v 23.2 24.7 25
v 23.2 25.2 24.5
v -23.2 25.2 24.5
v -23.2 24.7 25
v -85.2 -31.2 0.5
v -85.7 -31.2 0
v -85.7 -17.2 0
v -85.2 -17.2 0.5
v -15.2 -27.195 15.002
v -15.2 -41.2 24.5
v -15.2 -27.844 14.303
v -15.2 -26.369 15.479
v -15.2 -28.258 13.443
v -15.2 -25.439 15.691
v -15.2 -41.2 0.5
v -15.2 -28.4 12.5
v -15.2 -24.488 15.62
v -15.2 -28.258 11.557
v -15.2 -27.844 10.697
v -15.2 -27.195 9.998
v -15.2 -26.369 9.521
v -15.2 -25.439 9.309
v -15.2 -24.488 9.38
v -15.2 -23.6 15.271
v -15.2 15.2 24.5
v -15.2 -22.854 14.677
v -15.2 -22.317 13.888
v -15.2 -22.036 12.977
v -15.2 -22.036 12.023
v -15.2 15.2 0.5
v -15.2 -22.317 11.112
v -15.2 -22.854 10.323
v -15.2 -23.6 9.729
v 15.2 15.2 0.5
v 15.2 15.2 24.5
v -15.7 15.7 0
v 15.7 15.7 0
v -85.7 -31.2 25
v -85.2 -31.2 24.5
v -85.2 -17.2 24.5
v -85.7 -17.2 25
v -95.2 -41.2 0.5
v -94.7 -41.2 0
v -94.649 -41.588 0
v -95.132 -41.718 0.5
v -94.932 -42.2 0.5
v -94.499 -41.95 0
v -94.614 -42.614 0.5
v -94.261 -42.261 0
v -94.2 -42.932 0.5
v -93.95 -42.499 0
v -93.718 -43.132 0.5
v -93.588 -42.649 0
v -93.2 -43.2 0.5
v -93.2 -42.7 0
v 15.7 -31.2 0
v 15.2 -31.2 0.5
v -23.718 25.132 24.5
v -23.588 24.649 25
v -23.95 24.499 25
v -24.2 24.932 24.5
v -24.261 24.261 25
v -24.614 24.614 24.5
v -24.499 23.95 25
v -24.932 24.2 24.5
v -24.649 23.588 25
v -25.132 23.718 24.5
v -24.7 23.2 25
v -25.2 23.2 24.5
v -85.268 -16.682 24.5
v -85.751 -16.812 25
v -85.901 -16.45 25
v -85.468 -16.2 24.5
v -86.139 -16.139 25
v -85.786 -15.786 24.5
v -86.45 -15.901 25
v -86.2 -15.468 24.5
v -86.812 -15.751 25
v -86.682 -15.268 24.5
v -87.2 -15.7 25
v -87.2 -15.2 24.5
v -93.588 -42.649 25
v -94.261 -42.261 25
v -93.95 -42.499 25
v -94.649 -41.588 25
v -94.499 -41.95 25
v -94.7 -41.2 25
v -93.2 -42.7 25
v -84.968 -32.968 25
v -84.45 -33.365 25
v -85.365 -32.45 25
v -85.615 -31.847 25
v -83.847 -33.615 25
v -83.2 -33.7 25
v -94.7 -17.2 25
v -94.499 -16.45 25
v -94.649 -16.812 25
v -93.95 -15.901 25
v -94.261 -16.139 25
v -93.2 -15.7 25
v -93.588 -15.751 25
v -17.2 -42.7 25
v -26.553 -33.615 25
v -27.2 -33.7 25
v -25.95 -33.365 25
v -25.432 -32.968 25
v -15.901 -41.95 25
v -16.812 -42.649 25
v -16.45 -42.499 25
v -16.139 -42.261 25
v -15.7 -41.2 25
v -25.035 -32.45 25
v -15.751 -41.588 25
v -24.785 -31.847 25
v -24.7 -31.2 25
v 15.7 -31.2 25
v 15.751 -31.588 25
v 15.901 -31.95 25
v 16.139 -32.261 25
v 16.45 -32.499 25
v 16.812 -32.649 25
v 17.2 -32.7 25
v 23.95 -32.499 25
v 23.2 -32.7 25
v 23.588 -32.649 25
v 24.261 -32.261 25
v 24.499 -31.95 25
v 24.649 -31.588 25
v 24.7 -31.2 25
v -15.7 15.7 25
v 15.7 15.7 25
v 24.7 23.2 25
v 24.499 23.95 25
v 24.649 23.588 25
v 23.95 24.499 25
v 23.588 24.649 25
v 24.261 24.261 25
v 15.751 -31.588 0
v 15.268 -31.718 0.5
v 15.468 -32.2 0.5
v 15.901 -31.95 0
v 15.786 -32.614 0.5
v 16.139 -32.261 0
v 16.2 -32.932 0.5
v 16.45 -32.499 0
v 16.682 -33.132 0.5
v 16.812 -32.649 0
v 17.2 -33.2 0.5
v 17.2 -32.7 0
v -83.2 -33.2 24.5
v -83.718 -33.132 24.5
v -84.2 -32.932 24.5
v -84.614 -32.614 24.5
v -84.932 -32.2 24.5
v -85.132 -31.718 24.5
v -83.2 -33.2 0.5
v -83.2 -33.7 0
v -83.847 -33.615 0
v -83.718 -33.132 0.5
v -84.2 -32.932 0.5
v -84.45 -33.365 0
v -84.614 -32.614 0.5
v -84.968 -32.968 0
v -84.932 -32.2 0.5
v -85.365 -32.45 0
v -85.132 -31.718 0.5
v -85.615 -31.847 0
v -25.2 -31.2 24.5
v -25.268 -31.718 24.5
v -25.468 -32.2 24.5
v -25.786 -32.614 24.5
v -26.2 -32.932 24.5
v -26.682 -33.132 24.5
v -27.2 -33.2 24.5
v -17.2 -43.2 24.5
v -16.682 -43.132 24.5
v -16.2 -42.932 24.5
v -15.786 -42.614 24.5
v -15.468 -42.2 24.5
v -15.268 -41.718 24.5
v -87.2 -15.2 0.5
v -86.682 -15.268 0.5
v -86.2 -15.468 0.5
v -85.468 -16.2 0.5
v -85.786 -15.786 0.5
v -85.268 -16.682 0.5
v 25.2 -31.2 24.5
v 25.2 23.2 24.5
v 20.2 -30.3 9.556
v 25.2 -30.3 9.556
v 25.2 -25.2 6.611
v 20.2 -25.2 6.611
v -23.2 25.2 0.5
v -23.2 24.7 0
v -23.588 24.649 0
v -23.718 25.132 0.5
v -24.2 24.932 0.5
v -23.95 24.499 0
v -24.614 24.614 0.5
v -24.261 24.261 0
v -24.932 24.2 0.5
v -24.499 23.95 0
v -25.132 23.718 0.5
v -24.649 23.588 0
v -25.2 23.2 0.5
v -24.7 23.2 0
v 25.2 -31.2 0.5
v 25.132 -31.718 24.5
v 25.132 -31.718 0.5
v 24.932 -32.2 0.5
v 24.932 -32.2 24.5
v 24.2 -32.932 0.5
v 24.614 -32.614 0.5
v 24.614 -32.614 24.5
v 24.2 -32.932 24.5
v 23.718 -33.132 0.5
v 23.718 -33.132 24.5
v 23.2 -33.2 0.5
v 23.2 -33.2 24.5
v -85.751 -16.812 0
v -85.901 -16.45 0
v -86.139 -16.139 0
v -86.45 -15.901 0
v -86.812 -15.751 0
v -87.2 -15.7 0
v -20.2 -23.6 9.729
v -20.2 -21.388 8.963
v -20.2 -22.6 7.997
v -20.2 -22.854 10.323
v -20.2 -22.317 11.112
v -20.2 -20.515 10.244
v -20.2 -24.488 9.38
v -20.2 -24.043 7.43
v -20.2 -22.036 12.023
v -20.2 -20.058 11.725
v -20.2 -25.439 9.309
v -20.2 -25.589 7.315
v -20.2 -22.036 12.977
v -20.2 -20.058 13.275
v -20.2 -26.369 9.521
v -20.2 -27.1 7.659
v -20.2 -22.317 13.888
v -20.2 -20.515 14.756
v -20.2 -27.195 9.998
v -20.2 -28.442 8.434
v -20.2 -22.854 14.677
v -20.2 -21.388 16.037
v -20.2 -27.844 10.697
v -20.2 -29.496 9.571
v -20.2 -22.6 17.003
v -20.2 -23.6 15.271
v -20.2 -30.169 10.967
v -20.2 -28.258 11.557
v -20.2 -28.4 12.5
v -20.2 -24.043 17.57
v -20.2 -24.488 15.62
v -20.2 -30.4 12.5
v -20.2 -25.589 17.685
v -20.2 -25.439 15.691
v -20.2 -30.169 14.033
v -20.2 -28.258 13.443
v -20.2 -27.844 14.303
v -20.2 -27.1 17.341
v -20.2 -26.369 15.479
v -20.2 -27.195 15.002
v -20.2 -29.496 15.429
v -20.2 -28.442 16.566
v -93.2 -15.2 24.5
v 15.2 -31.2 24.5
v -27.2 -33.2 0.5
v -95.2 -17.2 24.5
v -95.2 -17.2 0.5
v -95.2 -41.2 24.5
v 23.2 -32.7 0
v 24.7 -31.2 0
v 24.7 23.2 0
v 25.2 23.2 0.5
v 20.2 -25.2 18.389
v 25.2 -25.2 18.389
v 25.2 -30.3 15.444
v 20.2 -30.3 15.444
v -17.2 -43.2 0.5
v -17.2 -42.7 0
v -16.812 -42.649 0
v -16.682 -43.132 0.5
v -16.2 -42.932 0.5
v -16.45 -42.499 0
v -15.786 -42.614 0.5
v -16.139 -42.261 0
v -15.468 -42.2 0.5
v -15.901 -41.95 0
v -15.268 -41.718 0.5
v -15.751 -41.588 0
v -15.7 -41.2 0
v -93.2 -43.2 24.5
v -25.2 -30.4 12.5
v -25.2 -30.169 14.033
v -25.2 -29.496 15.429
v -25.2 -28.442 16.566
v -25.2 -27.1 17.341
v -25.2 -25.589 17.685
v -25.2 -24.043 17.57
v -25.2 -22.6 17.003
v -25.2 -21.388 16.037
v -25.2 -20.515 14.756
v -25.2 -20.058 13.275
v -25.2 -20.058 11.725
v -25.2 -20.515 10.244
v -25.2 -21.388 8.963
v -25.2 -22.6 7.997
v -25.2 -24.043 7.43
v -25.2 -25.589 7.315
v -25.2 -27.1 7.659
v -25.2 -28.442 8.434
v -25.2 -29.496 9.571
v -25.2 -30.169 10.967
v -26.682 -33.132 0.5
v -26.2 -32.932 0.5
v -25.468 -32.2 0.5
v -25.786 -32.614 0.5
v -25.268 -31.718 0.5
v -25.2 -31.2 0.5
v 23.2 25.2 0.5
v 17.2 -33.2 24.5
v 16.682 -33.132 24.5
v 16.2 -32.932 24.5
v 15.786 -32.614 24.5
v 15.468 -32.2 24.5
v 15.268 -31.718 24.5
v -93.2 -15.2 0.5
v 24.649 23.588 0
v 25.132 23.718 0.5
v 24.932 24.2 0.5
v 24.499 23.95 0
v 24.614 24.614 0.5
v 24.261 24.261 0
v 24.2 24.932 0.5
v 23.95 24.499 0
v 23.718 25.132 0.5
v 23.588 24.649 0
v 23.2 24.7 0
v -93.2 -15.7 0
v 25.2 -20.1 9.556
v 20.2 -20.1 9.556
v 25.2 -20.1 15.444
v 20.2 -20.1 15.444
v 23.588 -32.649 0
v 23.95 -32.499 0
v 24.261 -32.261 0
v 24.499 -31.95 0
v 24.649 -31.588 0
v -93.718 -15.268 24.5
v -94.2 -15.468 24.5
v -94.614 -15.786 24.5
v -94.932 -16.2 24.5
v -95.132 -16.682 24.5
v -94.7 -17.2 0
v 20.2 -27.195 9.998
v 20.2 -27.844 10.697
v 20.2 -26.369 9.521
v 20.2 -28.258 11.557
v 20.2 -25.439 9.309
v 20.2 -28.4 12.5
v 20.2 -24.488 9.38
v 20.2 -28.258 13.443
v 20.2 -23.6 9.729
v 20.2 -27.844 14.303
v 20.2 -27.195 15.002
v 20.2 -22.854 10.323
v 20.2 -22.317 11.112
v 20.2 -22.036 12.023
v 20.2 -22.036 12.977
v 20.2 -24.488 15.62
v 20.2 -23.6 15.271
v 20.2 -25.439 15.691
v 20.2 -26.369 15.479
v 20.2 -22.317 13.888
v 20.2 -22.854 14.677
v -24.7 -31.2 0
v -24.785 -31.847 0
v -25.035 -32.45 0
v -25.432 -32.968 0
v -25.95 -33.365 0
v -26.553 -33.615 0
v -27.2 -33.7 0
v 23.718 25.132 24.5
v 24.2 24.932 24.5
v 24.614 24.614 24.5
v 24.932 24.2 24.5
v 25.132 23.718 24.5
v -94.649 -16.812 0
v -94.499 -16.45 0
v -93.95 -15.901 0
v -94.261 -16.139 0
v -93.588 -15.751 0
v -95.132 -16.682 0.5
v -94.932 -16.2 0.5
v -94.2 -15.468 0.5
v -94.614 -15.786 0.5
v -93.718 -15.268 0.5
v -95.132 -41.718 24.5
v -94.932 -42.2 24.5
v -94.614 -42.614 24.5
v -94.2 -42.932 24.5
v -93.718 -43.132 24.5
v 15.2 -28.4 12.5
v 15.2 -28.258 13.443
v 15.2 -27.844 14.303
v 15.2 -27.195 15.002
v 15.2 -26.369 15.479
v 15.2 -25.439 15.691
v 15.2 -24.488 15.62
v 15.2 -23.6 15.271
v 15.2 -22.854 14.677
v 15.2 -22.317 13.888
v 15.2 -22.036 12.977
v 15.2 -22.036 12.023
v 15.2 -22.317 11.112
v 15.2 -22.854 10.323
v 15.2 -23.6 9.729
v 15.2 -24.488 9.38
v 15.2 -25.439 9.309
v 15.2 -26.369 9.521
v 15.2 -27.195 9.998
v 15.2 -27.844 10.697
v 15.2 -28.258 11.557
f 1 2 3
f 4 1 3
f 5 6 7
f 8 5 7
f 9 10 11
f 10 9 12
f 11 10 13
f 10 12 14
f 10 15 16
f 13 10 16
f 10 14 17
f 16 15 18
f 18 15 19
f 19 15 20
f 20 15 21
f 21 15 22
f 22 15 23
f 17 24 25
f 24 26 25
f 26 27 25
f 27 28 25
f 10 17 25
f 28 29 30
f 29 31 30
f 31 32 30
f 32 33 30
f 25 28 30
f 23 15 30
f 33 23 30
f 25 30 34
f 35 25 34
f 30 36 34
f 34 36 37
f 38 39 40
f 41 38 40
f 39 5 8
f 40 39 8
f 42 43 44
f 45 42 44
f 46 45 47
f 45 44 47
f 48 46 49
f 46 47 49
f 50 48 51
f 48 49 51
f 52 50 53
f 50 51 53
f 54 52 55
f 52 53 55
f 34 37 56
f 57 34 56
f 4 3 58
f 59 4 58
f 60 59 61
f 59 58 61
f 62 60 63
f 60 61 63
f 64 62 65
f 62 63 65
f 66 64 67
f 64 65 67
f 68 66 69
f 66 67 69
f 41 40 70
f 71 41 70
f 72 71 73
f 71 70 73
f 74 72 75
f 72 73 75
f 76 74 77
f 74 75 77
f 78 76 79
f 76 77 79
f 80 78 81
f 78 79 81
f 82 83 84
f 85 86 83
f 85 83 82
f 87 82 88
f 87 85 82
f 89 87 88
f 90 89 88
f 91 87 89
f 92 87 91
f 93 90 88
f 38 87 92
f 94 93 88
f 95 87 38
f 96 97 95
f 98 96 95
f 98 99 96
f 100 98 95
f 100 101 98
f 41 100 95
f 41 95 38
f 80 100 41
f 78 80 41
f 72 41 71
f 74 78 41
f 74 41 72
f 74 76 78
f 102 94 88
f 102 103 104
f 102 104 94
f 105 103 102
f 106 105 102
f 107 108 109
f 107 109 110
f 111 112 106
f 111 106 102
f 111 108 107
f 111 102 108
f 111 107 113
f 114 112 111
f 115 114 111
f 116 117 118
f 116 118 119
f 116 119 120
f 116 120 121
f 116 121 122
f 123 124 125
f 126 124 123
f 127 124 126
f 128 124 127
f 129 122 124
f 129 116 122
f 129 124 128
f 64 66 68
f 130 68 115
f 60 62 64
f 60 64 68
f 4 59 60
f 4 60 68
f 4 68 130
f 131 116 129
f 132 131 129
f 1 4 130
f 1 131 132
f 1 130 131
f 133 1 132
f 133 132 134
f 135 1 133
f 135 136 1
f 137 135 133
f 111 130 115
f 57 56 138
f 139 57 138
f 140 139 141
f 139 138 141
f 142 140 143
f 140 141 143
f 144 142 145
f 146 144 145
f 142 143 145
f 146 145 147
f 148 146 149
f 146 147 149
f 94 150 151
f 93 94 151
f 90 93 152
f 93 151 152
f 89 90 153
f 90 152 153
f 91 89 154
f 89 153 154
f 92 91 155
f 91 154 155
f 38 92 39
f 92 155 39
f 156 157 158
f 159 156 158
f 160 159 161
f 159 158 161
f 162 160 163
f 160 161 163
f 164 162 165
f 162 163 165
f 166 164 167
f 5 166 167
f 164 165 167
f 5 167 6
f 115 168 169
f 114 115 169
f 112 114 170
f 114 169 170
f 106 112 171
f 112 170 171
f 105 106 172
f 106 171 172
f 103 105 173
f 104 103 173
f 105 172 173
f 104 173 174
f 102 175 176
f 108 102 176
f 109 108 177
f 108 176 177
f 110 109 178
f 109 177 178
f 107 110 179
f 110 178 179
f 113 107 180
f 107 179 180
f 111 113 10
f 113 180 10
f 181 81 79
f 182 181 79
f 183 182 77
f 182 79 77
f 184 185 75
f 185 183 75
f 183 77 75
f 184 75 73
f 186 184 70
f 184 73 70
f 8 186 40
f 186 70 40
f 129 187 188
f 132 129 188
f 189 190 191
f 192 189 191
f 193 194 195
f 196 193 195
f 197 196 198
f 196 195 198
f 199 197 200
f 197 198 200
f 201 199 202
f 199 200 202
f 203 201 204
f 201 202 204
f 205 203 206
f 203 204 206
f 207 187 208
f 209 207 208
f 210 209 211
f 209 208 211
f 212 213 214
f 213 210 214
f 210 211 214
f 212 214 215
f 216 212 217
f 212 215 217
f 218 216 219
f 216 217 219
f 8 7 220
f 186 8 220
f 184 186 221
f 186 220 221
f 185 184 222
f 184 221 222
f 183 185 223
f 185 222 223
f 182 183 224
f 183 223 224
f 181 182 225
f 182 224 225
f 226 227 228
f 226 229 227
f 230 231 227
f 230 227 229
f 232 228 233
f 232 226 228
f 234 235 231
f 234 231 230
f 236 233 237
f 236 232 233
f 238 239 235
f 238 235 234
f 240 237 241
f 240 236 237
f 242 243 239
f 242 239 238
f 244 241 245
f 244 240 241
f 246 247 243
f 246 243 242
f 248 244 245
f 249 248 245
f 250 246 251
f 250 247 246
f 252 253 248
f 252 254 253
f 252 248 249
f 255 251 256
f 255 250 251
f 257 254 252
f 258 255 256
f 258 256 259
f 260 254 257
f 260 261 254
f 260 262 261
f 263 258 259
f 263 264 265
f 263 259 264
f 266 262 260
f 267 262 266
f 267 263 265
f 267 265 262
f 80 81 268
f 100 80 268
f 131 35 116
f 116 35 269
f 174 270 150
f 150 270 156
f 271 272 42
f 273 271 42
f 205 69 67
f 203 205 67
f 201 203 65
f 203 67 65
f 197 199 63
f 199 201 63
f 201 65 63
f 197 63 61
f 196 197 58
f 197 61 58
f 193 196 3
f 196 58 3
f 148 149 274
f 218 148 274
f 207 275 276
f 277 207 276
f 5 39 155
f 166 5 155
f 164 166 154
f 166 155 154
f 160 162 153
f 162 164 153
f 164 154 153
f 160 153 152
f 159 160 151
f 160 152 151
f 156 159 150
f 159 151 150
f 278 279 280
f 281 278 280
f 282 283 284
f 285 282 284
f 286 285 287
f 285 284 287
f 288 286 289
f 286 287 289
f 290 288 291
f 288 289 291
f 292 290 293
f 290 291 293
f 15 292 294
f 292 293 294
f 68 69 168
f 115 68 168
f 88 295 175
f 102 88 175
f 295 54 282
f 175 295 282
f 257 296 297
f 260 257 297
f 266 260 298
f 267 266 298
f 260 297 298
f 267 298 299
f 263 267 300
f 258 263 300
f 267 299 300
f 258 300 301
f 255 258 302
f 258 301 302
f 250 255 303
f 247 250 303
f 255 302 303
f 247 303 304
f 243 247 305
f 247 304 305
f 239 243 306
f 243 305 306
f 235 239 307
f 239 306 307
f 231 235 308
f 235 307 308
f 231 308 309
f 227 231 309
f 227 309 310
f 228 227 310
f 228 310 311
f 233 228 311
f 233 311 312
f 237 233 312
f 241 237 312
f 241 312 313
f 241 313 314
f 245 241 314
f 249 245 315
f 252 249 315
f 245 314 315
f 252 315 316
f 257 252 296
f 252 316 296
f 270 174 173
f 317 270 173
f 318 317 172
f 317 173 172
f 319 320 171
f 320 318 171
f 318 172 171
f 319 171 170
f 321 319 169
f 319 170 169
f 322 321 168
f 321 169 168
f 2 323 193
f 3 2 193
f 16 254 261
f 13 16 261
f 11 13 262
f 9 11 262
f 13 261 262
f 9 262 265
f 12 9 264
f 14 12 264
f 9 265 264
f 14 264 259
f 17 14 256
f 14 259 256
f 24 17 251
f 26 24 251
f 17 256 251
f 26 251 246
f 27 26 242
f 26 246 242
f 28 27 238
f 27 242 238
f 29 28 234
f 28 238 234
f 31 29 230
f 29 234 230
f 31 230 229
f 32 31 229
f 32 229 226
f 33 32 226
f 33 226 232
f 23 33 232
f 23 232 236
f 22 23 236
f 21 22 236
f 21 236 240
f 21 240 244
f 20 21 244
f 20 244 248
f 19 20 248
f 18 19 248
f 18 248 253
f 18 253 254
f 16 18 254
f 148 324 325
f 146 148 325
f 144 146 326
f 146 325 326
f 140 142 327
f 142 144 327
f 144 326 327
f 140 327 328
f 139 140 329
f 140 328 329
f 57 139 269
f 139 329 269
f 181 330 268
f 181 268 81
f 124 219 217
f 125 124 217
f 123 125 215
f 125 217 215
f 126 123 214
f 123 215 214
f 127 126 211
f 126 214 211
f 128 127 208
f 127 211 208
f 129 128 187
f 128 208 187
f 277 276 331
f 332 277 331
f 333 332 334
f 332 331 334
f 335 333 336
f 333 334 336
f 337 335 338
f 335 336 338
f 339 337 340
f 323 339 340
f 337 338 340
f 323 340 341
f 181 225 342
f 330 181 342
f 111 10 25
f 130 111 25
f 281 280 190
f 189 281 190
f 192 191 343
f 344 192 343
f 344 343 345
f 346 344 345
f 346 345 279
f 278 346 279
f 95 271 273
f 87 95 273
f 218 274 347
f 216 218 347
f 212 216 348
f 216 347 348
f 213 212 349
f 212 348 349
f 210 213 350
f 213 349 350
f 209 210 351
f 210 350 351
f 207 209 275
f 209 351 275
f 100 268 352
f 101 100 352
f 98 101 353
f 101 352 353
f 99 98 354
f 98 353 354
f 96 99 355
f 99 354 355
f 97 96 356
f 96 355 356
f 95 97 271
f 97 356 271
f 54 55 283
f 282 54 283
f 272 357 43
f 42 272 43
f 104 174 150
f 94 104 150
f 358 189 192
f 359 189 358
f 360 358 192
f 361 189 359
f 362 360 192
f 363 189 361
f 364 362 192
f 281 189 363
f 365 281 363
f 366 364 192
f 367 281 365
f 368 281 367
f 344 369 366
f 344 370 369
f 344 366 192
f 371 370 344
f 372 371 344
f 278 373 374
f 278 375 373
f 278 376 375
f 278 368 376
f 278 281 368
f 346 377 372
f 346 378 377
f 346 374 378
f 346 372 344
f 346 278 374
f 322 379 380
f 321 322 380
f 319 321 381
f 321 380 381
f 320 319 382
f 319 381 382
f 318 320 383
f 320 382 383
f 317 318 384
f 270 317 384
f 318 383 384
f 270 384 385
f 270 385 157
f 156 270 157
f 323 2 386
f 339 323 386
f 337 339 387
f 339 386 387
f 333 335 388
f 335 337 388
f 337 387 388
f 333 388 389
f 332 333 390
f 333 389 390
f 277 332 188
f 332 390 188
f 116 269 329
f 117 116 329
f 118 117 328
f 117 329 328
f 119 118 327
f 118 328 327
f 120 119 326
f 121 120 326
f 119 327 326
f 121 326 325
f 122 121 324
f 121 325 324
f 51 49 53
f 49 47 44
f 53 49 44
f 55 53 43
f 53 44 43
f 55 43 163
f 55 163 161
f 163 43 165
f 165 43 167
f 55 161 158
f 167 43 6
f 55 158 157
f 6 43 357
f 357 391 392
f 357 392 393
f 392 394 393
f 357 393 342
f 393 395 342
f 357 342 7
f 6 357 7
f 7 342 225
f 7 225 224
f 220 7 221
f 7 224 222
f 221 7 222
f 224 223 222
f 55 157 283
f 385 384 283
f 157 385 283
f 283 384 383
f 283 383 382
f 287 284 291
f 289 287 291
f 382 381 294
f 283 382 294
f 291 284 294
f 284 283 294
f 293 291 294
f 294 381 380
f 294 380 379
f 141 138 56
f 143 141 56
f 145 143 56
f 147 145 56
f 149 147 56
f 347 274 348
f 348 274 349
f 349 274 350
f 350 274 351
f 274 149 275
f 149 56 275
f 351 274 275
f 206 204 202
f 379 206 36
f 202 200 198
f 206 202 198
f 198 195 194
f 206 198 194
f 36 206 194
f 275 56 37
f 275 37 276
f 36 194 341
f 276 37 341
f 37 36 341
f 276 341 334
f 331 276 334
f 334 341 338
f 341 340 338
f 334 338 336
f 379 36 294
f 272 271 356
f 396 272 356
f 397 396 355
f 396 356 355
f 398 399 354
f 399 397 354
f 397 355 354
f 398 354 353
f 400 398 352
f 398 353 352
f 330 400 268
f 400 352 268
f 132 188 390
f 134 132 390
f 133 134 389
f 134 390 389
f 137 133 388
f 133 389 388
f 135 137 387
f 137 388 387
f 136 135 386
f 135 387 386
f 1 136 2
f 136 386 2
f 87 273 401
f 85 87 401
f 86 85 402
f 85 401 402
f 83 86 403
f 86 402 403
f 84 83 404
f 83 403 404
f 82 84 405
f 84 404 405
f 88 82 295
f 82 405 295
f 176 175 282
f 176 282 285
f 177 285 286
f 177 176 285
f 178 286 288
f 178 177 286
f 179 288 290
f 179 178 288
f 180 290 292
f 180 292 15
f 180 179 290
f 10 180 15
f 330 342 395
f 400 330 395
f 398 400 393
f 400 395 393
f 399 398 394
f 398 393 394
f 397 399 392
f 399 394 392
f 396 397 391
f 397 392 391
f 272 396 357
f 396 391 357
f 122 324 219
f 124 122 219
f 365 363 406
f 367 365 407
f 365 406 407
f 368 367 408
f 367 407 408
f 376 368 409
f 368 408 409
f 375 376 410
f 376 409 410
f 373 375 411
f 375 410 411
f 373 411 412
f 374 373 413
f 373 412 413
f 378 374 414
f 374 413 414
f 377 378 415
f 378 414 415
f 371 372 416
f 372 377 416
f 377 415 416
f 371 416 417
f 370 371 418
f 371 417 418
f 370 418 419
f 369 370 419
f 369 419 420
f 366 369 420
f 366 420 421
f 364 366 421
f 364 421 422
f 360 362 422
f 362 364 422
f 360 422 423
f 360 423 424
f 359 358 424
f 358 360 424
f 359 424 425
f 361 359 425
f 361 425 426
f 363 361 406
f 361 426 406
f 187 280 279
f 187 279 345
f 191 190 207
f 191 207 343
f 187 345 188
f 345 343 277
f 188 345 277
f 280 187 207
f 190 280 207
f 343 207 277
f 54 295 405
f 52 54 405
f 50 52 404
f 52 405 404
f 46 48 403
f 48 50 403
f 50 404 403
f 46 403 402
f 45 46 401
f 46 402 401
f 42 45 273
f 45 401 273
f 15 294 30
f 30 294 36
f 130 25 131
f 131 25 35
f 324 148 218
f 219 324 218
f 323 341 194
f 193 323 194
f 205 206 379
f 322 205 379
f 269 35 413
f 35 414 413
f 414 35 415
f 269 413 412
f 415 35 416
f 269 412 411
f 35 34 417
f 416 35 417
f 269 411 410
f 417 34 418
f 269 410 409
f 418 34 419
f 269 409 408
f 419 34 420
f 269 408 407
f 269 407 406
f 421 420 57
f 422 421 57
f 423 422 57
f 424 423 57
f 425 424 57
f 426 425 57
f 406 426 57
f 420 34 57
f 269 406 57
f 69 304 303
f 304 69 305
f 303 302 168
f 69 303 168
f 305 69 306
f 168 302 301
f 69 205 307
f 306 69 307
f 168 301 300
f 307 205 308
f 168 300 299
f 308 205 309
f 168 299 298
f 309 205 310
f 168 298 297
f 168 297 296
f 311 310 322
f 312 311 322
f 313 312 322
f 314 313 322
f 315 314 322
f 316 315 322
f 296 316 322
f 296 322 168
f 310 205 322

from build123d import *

# Parameters (mm, degrees)
F0_W     = 10
F0_H     = 18
F1_DEPTH = 25
F2_R     = 3.2
F3_DEPTH = 50.401
F2_R_2   = 5.2
F4_DEPTH = 5
F5_R     = 3.2
F6_DEPTH = 5
F7_R     = 2
F8_SIZE  = 0.5


with BuildPart() as f1:
    # F0 (on Top) → F1 (new body)
    with BuildSketch(Plane.XY):
        Polygon((-15.2, 15.2), (15.2, 15.2), (15.2, -33.2), (25.2, -33.2), (25.2, 25.2), (-25.2, 25.2), (-25.2, -33.2), (-15.2, -33.2), align=None)
        Polygon((-15.2, -43.2), (-15.2, -33.2), (-25.2, -33.2), (-85.2, -33.2), (-95.2, -33.2), (-95.2, -43.2), align=None)
        with Locations((-90.2, -24.2)):
            Rectangle(F0_W, F0_H)
    extrude(amount=F1_DEPTH)

    # F2 (on face) → F3 (cut, through all)
    with BuildSketch(Plane(origin=(-25.2, 0, 0), x_dir=(0, -1, 0), z_dir=(-1, 0, 0))):
        with Locations((25.2, 12.5)):
            Circle(F2_R)
    extrude(amount=-F3_DEPTH, mode=Mode.SUBTRACT)

    # F2 (on face) → F4 (cut)
    with BuildSketch(Plane(origin=(-25.2, 0, 0), x_dir=(0, -1, 0), z_dir=(-1, 0, 0))):
        with Locations((25.2, 12.5)):
            Circle(F2_R_2)
        with Locations((25.2, 12.5)):
            Circle(F2_R, mode=Mode.SUBTRACT)
    extrude(amount=-F4_DEPTH, mode=Mode.SUBTRACT)

    # F5 (on face) → F6 (cut)
    with BuildSketch(Plane.YZ.offset(25.2)):
        Polygon((-30.3, 9.555514), (-25.2, 6.611027), (-20.1, 9.555514), (-20.1, 15.444486), (-25.2, 18.388973), (-30.3, 15.444486), align=None)
        with Locations((-25.2, 12.5)):
            Circle(F5_R, mode=Mode.SUBTRACT)
    extrude(amount=-F6_DEPTH, mode=Mode.SUBTRACT)

    # F7
    f7_edges = [f1.edges().sort_by_distance(p)[0] for p in [
        (-25.2, -33.2, 12.5),
        (-15.2, -43.2, 12.5),
        (15.2, -33.2, 12.5),
        (25.2, -33.2, 12.5),
        (25.2, 25.2, 12.5),
        (-85.2, -33.2, 12.5),
        (-85.2, -15.2, 12.5),
        (-95.2, -15.2, 12.5),
        (-95.2, -43.2, 12.5),
        (-25.2, 25.2, 12.5),
    ]]
    fillet(f7_edges, radius=F7_R)

    # F8
    f8_edges = [f1.edges().sort_by_distance(p)[0] for p in [
        (15.2, -8, 25),
        (15.785786, -32.614214, 25),
        (0, 15.2, 25),
        (20.2, -33.2, 25),
        (-15.2, -13, 25),
        (24.614214, -32.614214, 25),
        (-15.785786, -42.614214, 25),
        (25.2, -4, 25),
        (-55.2, -43.2, 25),
        (24.614214, 24.614214, 25),
        (-94.614214, -42.614214, 25),
        (0, 25.2, 25),
        (-95.2, -29.2, 25),
        (-24.614214, 24.614214, 25),
        (-94.614214, -15.785786, 25),
        (-25.2, -4, 25),
        (-90.2, -15.2, 25),
        (-25.785786, -32.614214, 25),
        (-85.785786, -15.785786, 25),
        (-55.2, -33.2, 25),
        (-85.2, -24.2, 25),
        (-84.614214, -32.614214, 25),
        (15.2, -8, 0),
        (15.785786, -32.614214, 0),
        (0, 15.2, 0),
        (20.2, -33.2, 0),
        (-15.2, -13, 0),
        (24.614214, -32.614214, 0),
        (-15.785786, -42.614214, 0),
        (25.2, -4, 0),
        (-55.2, -43.2, 0),
        (24.614214, 24.614214, 0),
        (-94.614214, -42.614214, 0),
        (0, 25.2, 0),
        (-95.2, -29.2, 0),
        (-24.614214, 24.614214, 0),
        (-94.614214, -15.785786, 0),
        (-25.2, -4, 0),
        (-90.2, -15.2, 0),
        (-25.785786, -32.614214, 0),
        (-85.785786, -15.785786, 0),
        (-55.2, -33.2, 0),
        (-85.2, -24.2, 0),
        (-84.614214, -32.614214, 0),
    ]]
    chamfer(f8_edges, length=F8_SIZE)


solid = f1.part
